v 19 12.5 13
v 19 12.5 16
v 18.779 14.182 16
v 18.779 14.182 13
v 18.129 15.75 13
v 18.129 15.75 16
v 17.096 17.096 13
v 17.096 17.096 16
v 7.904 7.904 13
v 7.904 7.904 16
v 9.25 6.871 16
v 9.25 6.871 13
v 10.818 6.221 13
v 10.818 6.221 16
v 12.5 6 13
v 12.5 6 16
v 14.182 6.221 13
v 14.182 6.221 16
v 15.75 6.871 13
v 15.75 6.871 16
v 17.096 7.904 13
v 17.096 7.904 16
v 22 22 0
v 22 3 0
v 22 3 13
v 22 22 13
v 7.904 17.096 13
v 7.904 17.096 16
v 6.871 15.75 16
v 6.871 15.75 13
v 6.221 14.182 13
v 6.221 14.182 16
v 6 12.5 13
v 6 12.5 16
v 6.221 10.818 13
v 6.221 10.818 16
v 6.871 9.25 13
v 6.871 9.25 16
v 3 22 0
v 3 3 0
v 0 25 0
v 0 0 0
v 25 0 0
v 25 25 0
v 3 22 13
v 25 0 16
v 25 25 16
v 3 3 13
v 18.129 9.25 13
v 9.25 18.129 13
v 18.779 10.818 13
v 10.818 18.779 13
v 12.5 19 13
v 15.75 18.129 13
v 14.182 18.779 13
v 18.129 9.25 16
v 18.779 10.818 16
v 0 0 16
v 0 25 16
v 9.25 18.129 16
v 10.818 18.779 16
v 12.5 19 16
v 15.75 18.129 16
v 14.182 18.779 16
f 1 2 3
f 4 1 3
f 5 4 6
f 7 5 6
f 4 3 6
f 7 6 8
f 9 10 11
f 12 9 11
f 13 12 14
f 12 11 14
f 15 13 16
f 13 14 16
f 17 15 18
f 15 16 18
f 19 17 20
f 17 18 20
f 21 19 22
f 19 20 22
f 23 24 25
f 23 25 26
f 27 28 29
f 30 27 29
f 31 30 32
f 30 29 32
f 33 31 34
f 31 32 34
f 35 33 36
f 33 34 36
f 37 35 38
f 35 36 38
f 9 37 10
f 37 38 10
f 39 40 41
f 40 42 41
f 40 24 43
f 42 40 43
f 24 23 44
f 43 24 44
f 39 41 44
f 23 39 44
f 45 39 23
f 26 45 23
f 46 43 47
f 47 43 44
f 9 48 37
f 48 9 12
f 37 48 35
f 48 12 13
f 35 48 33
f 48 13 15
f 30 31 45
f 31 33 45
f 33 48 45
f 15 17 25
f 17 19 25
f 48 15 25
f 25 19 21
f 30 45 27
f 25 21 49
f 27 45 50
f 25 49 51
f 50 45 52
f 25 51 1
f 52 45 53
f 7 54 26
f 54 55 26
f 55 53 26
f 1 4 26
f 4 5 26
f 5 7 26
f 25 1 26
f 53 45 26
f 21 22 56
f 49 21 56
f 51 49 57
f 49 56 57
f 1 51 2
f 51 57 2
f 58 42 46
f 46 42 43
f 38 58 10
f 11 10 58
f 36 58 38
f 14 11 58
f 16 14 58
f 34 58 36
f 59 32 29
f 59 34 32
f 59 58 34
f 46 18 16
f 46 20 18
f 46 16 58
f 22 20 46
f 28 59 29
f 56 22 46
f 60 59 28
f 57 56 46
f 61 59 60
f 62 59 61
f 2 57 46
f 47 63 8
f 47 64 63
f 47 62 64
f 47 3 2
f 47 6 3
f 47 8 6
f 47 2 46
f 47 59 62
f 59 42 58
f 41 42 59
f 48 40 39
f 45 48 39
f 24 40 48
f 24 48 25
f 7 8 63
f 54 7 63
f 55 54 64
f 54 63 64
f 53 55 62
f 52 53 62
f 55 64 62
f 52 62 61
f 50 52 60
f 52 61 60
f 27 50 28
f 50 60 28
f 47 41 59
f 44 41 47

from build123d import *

# Parameters (mm, degrees)
F0_W     = 25
F0_H     = 25
F1_DEPTH = 16
F2_T     = -3
F4_DEPTH = 25


with BuildPart() as f1:
    # F0 (on Top) → F1 (new body)
    with BuildSketch(Plane.XY):
        with Locations((12.5, 12.5)):
            Rectangle(F0_W, F0_H)
    extrude(amount=F1_DEPTH)

    # F2
    f2_openings = [f1.faces().sort_by_distance(p)[0] for p in [
        (12.5, 12.5, 0),
    ]]
    offset(amount=F2_T, openings=f2_openings)

    # F3 (on face) → F4 (cut)
    with BuildSketch(Plane.XY.offset(16)):
        with BuildLine():
            Line((12.5, 12.5), (17.0961940777, 17.0961940777))
            ThreePointArc((17.0961940777, 17.0961940777), (12.5, 19), (7.9038059223, 17.0961940777))
            Line((7.9038059223, 17.0961940777), (12.5, 12.5))
        make_face()
        with BuildLine():
            ThreePointArc((19, 12.5), (18.5052169613, 14.9874423104), (17.0961940777, 17.0961940777))
            Line((17.0961940777, 17.0961940777), (12.5, 12.5))
            Line((12.5, 12.5), (17.0961940777, 7.9038059223))
            ThreePointArc((17.0961940777, 7.9038059223), (18.5052169613, 10.0125576896), (19, 12.5))
        make_face()
        with BuildLine():
            Line((17.0961940777, 7.9038059223), (12.5, 12.5))
            Line((12.5, 12.5), (7.9038059223, 7.9038059223))
            ThreePointArc((7.9038059223, 7.9038059223), (12.5, 6), (17.0961940777, 7.9038059223))
        make_face()
        with BuildLine():
            Line((7.9038059223, 7.9038059223), (12.5, 12.5))
            Line((12.5, 12.5), (7.9038059223, 17.0961940777))
            ThreePointArc((7.9038059223, 17.0961940777), (6, 12.5), (7.9038059223, 7.9038059223))
        make_face()
    extrude(amount=-F4_DEPTH, mode=Mode.SUBTRACT)


solid = f1.part
